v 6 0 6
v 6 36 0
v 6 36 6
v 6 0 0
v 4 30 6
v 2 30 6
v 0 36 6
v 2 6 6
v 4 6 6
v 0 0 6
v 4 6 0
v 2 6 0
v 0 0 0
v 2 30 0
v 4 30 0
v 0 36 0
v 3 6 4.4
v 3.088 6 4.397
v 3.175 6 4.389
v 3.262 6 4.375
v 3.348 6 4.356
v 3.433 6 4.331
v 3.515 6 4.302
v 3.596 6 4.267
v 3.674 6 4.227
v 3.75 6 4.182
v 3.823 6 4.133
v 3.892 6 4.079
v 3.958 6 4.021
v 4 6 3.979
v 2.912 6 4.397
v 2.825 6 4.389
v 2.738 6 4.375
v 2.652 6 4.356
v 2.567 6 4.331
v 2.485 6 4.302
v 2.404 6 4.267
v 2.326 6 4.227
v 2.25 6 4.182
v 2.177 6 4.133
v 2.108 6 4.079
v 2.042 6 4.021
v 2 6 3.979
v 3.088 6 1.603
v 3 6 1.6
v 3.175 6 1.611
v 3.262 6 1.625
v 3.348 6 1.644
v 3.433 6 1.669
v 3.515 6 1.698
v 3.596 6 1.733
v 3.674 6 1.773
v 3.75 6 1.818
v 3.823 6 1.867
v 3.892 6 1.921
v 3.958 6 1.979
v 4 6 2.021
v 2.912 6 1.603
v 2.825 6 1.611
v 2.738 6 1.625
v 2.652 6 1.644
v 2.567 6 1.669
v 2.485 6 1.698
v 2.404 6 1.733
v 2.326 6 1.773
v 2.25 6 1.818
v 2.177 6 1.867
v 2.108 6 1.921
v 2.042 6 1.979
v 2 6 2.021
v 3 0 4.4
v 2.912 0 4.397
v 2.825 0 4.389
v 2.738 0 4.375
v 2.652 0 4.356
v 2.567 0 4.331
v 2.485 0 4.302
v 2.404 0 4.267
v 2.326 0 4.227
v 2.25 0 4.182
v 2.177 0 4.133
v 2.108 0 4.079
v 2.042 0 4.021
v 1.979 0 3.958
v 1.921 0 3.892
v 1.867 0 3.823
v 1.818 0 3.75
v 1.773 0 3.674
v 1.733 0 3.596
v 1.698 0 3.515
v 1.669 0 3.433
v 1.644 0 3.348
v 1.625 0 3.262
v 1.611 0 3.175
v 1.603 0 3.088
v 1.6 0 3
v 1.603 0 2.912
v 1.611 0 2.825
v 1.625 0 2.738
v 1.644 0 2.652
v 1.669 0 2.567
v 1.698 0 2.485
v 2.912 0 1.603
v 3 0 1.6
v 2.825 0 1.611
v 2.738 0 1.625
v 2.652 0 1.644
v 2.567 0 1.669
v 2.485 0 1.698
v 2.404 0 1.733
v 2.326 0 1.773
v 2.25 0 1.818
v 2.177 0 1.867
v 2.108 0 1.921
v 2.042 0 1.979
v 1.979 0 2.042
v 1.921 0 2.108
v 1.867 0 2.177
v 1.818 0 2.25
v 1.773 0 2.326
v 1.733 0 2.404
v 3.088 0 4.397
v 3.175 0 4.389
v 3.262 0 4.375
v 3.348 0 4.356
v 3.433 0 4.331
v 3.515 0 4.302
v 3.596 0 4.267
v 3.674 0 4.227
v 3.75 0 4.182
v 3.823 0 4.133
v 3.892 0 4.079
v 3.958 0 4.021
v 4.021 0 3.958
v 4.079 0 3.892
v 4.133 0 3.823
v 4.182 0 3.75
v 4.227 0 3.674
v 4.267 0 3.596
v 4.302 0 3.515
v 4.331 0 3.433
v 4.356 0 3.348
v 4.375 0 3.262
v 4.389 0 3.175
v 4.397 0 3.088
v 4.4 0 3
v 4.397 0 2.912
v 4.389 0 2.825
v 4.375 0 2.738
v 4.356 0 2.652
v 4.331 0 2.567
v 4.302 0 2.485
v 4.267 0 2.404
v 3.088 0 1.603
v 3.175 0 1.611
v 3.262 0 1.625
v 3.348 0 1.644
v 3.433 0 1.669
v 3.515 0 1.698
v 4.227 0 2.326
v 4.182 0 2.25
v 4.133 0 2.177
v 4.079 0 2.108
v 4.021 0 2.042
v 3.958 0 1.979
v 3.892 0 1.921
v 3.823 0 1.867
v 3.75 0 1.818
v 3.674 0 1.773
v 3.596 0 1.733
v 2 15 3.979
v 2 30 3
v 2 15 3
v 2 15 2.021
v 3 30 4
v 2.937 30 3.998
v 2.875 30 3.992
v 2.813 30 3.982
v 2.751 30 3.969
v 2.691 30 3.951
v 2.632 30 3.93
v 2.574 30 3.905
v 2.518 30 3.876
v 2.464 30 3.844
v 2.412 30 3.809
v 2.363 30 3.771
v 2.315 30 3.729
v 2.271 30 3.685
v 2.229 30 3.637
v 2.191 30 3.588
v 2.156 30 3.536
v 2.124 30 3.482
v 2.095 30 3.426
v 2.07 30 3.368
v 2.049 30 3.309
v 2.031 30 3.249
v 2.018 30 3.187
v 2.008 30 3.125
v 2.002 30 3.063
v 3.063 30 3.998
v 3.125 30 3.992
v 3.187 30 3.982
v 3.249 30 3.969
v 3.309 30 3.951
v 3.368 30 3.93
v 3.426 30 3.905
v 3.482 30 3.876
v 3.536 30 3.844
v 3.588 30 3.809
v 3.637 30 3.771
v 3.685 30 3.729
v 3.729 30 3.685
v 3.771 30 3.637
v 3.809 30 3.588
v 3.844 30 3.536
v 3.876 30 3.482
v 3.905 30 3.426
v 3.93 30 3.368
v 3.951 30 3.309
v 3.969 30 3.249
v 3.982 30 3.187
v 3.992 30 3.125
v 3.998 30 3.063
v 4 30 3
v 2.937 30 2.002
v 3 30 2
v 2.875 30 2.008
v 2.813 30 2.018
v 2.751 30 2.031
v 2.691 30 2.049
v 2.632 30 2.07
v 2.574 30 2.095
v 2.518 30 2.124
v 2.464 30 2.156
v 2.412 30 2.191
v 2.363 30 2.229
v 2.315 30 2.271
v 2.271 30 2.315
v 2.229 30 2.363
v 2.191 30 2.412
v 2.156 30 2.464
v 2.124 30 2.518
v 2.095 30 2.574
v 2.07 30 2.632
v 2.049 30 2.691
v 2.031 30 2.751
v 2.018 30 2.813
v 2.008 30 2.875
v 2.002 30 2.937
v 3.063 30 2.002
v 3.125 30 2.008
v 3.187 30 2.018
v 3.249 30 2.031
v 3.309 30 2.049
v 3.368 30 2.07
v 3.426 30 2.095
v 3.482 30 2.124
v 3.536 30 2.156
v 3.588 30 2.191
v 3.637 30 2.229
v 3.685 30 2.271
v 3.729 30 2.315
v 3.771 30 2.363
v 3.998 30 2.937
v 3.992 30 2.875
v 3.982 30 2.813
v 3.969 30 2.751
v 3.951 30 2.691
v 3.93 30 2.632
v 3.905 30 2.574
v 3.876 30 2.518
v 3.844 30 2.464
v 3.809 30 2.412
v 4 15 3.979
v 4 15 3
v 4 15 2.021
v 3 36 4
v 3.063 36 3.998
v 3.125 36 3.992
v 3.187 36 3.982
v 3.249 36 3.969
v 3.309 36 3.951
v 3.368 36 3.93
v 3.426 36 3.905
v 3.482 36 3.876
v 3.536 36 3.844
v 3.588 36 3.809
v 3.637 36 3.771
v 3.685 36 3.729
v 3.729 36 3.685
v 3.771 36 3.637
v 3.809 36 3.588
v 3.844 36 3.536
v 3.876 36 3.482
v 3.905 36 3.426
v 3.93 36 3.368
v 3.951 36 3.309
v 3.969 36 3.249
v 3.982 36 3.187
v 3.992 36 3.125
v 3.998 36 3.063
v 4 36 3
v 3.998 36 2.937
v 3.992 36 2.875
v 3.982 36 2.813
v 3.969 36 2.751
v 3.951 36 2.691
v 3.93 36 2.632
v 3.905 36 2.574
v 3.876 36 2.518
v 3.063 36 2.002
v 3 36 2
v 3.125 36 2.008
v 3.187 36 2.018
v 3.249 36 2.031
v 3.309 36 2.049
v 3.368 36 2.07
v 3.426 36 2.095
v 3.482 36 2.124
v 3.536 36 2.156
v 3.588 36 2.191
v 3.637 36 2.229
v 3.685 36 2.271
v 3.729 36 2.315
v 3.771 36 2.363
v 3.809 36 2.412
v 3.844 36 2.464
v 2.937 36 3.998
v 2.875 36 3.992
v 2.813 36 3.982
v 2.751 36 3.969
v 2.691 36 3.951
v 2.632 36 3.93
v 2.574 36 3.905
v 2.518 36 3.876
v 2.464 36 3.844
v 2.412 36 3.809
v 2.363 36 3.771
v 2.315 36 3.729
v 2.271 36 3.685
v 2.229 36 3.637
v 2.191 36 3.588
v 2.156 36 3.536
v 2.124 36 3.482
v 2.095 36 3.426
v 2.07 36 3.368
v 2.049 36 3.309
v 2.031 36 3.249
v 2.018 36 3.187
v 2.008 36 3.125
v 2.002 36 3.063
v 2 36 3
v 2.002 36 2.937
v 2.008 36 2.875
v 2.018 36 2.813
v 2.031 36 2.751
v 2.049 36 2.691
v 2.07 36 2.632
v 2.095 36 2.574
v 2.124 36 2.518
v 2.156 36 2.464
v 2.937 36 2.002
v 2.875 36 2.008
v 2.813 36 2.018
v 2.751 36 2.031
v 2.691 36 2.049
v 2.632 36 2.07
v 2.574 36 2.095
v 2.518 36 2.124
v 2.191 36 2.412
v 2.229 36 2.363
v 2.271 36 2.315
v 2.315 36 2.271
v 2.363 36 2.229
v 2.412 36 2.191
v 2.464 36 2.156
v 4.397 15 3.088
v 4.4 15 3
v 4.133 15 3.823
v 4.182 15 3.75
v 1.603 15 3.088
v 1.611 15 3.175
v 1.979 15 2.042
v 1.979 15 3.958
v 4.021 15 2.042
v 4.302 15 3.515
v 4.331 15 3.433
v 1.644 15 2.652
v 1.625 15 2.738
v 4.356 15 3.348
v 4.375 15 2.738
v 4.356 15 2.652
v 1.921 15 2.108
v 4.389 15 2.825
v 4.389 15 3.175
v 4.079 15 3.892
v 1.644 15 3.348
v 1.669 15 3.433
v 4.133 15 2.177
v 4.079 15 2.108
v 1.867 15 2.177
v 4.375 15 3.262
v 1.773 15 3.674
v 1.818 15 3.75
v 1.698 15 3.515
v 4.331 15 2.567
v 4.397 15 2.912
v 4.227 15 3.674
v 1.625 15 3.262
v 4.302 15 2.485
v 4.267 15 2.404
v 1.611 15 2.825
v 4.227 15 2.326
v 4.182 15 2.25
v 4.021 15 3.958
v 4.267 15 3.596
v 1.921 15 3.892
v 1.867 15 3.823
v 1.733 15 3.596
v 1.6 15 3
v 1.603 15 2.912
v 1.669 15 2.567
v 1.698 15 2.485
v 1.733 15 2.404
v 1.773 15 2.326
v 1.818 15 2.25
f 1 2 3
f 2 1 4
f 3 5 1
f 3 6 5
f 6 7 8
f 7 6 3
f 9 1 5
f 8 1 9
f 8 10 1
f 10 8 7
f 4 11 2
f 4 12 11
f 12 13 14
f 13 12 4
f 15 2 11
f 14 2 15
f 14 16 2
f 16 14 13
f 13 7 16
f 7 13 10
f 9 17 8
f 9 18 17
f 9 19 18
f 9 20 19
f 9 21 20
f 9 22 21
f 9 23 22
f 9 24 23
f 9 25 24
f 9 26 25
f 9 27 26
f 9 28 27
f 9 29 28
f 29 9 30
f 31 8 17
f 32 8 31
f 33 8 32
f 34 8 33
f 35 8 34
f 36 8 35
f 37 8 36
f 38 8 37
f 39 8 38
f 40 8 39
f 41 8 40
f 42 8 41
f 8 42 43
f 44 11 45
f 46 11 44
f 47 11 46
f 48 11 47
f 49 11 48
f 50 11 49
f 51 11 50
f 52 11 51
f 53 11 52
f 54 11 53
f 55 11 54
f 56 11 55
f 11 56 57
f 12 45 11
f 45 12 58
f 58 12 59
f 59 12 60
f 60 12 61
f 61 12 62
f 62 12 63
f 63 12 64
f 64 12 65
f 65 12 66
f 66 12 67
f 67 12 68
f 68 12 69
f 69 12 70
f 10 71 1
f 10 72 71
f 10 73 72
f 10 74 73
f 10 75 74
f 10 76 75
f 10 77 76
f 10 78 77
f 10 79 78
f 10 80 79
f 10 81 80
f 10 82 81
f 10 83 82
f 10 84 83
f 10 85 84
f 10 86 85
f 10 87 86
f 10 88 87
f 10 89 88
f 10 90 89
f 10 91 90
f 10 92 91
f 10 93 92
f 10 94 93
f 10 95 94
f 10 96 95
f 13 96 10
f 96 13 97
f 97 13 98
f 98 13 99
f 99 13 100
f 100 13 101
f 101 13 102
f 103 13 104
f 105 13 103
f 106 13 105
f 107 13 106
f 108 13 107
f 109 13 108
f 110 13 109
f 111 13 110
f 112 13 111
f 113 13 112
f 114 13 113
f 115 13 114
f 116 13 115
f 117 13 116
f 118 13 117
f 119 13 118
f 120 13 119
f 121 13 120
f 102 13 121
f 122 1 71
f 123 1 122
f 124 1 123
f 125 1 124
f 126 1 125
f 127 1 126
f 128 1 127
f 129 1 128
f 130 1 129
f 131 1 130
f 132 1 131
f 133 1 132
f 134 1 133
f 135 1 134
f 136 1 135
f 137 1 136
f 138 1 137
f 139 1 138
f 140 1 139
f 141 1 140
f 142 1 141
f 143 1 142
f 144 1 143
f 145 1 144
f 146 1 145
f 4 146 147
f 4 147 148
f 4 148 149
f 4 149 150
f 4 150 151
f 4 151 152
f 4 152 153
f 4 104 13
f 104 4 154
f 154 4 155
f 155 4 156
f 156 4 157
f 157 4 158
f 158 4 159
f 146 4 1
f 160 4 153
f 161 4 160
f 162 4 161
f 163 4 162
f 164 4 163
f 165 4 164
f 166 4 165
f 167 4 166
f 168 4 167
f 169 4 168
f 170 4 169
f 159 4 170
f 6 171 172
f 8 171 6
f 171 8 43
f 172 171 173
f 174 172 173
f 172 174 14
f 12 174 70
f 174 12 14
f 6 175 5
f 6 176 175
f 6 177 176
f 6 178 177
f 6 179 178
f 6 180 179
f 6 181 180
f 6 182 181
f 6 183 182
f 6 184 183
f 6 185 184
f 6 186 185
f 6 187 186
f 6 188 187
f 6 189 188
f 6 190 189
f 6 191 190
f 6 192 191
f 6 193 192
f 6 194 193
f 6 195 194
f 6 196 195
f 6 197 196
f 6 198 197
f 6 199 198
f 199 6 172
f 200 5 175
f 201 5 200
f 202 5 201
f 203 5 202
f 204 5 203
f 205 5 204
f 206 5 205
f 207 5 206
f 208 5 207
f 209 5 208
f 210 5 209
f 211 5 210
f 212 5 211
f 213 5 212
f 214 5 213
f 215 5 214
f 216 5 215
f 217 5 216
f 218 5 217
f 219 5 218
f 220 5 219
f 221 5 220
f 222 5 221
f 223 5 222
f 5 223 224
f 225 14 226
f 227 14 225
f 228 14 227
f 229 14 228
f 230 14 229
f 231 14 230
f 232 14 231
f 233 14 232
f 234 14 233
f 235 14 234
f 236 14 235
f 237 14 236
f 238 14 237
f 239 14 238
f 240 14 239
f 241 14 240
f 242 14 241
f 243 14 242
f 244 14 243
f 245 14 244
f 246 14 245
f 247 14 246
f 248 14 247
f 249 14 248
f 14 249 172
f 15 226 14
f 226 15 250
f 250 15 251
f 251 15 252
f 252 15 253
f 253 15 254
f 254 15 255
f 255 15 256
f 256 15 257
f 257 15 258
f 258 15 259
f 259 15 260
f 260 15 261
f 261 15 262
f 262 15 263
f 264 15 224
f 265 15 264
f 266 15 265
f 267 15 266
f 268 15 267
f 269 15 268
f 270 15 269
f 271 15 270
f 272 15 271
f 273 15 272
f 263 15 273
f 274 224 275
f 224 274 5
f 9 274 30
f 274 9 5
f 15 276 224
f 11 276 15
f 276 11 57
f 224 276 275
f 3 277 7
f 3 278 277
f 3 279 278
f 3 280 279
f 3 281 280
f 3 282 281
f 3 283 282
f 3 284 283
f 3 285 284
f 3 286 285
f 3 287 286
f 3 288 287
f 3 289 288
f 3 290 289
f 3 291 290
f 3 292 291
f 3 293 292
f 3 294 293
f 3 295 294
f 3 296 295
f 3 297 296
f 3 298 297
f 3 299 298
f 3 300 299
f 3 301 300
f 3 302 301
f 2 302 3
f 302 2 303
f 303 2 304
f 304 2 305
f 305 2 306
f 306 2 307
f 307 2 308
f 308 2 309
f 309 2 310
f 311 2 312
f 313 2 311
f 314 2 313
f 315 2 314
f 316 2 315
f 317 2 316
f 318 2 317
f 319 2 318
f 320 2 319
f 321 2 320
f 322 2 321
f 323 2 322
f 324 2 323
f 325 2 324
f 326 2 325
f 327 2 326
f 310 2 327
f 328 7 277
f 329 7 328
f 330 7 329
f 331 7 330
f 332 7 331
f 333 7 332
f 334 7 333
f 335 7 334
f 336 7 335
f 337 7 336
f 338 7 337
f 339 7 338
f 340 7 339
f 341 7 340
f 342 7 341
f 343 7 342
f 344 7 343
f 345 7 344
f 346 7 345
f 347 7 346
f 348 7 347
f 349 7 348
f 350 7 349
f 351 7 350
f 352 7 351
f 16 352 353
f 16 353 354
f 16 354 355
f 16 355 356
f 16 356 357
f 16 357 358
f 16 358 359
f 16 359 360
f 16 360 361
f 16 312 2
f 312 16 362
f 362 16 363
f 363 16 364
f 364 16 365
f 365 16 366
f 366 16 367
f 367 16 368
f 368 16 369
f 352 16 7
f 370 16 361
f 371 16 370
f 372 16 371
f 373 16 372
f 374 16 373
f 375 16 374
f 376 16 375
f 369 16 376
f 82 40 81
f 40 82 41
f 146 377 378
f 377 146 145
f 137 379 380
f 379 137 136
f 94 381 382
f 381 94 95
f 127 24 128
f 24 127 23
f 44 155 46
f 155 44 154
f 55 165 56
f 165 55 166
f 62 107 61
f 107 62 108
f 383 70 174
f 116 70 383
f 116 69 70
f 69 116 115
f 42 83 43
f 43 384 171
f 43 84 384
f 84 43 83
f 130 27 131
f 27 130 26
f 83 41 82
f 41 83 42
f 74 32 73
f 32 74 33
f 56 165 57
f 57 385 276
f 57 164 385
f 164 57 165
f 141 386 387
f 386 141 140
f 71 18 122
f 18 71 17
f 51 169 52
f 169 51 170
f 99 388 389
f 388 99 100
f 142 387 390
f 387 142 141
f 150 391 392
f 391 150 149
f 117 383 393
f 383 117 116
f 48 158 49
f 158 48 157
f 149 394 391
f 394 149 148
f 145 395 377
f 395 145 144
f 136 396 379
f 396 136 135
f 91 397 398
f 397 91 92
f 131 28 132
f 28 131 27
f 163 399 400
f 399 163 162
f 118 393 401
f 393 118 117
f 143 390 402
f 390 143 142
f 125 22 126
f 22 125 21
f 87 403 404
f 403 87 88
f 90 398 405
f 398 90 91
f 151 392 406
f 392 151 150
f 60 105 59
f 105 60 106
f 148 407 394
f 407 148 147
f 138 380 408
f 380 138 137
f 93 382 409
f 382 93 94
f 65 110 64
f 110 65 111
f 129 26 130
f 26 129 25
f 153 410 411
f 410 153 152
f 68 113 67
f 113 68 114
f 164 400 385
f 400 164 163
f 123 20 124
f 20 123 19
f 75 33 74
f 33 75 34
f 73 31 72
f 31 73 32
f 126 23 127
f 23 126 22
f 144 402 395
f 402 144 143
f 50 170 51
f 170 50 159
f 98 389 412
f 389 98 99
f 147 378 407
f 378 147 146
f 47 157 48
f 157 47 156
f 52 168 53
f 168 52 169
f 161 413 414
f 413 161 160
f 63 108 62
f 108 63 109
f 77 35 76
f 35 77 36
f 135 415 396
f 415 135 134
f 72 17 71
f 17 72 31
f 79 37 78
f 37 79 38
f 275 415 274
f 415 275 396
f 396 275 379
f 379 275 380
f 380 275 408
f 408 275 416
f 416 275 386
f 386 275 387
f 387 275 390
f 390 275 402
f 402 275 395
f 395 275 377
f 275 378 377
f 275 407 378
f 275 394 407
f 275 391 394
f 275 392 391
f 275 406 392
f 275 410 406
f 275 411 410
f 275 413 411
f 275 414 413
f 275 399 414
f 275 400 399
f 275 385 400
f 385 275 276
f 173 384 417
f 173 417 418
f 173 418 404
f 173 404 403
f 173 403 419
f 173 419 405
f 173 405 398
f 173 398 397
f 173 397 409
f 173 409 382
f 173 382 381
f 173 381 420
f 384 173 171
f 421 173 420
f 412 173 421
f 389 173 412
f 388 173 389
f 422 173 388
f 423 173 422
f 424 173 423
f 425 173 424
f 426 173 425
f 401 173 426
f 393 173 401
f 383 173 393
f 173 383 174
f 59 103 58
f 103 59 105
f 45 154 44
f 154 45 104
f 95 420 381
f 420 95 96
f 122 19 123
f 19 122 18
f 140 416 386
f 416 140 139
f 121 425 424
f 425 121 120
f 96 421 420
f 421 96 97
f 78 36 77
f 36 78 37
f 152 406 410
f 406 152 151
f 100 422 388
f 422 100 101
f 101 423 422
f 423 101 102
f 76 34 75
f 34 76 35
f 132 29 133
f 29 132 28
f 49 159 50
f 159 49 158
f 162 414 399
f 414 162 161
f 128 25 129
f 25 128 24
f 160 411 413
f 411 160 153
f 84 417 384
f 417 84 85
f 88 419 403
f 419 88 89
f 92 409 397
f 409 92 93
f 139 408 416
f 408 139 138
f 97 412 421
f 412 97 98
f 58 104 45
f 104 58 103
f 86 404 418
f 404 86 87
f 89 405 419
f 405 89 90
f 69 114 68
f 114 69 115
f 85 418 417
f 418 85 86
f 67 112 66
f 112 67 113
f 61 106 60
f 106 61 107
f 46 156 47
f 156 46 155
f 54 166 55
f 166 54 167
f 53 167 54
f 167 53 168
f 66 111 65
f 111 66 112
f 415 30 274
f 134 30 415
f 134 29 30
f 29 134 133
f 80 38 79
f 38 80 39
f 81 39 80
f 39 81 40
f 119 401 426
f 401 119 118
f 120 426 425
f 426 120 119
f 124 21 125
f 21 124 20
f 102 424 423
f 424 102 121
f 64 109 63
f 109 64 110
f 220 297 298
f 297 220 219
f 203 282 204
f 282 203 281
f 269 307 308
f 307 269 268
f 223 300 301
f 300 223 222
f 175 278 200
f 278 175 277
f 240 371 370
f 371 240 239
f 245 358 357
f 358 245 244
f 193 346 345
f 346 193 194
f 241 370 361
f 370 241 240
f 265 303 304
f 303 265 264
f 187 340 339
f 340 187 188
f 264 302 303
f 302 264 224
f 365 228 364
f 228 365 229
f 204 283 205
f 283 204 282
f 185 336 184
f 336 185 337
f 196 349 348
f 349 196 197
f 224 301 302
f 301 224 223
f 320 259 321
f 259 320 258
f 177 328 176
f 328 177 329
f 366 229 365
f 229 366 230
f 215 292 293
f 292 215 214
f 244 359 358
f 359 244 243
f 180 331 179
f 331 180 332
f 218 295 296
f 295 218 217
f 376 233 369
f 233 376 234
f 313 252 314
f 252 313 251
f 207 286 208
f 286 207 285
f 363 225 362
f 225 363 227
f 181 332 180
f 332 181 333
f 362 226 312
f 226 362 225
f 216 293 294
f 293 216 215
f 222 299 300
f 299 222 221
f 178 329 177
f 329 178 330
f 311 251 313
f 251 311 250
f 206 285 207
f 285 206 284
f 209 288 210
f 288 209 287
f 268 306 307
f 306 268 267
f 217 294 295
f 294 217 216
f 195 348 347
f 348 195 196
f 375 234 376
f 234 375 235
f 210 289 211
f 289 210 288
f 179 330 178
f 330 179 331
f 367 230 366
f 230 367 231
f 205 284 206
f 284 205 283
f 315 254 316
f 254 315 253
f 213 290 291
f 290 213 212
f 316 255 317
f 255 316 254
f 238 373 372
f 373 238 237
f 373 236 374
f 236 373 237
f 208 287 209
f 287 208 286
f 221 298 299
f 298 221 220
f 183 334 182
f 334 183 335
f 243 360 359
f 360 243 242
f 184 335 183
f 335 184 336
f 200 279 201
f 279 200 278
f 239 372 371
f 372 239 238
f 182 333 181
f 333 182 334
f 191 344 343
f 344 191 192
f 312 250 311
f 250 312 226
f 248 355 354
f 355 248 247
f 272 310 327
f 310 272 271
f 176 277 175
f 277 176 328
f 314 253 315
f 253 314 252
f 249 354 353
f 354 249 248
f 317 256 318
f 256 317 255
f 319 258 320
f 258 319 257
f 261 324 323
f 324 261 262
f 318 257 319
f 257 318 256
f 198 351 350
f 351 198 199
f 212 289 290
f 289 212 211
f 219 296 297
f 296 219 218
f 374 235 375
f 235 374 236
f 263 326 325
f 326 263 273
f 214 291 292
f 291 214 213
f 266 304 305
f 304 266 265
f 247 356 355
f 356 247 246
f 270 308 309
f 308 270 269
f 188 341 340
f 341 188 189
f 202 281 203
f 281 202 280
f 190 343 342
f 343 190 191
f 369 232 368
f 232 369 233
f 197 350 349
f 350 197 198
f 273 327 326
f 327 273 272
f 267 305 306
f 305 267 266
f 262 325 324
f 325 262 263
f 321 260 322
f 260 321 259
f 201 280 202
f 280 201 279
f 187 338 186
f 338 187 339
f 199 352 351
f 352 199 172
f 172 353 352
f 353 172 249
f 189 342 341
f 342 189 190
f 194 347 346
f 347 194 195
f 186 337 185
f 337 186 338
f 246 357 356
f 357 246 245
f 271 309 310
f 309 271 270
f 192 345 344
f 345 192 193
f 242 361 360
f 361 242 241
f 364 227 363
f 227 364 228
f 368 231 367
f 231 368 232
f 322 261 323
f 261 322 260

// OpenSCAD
difference(){
	union(){        
        translate([0,0,0]){
           cube([6,6,6], center=false);
        }
        translate([0,0,0]){
           cube([2,30,6], center=false);
        }
        translate([4,0,0]){
           cube([2,30,6], center=false);
        }
        translate([0,30,0]){
           cube([6,6,6], center=false);
        }
        
	}
	union() {
        translate([3,0,3]){
            rotate(a = [90,0,0]) {
                cylinder(h=30, r=1.4, $fn=100, center=true);
            }
        }	
        translate([3,0,3]){
            rotate(a = [90,0,0]) {
                cylinder(h=300, r=1.0, $fn=100, center=true);
            }
        }	
	}
}
